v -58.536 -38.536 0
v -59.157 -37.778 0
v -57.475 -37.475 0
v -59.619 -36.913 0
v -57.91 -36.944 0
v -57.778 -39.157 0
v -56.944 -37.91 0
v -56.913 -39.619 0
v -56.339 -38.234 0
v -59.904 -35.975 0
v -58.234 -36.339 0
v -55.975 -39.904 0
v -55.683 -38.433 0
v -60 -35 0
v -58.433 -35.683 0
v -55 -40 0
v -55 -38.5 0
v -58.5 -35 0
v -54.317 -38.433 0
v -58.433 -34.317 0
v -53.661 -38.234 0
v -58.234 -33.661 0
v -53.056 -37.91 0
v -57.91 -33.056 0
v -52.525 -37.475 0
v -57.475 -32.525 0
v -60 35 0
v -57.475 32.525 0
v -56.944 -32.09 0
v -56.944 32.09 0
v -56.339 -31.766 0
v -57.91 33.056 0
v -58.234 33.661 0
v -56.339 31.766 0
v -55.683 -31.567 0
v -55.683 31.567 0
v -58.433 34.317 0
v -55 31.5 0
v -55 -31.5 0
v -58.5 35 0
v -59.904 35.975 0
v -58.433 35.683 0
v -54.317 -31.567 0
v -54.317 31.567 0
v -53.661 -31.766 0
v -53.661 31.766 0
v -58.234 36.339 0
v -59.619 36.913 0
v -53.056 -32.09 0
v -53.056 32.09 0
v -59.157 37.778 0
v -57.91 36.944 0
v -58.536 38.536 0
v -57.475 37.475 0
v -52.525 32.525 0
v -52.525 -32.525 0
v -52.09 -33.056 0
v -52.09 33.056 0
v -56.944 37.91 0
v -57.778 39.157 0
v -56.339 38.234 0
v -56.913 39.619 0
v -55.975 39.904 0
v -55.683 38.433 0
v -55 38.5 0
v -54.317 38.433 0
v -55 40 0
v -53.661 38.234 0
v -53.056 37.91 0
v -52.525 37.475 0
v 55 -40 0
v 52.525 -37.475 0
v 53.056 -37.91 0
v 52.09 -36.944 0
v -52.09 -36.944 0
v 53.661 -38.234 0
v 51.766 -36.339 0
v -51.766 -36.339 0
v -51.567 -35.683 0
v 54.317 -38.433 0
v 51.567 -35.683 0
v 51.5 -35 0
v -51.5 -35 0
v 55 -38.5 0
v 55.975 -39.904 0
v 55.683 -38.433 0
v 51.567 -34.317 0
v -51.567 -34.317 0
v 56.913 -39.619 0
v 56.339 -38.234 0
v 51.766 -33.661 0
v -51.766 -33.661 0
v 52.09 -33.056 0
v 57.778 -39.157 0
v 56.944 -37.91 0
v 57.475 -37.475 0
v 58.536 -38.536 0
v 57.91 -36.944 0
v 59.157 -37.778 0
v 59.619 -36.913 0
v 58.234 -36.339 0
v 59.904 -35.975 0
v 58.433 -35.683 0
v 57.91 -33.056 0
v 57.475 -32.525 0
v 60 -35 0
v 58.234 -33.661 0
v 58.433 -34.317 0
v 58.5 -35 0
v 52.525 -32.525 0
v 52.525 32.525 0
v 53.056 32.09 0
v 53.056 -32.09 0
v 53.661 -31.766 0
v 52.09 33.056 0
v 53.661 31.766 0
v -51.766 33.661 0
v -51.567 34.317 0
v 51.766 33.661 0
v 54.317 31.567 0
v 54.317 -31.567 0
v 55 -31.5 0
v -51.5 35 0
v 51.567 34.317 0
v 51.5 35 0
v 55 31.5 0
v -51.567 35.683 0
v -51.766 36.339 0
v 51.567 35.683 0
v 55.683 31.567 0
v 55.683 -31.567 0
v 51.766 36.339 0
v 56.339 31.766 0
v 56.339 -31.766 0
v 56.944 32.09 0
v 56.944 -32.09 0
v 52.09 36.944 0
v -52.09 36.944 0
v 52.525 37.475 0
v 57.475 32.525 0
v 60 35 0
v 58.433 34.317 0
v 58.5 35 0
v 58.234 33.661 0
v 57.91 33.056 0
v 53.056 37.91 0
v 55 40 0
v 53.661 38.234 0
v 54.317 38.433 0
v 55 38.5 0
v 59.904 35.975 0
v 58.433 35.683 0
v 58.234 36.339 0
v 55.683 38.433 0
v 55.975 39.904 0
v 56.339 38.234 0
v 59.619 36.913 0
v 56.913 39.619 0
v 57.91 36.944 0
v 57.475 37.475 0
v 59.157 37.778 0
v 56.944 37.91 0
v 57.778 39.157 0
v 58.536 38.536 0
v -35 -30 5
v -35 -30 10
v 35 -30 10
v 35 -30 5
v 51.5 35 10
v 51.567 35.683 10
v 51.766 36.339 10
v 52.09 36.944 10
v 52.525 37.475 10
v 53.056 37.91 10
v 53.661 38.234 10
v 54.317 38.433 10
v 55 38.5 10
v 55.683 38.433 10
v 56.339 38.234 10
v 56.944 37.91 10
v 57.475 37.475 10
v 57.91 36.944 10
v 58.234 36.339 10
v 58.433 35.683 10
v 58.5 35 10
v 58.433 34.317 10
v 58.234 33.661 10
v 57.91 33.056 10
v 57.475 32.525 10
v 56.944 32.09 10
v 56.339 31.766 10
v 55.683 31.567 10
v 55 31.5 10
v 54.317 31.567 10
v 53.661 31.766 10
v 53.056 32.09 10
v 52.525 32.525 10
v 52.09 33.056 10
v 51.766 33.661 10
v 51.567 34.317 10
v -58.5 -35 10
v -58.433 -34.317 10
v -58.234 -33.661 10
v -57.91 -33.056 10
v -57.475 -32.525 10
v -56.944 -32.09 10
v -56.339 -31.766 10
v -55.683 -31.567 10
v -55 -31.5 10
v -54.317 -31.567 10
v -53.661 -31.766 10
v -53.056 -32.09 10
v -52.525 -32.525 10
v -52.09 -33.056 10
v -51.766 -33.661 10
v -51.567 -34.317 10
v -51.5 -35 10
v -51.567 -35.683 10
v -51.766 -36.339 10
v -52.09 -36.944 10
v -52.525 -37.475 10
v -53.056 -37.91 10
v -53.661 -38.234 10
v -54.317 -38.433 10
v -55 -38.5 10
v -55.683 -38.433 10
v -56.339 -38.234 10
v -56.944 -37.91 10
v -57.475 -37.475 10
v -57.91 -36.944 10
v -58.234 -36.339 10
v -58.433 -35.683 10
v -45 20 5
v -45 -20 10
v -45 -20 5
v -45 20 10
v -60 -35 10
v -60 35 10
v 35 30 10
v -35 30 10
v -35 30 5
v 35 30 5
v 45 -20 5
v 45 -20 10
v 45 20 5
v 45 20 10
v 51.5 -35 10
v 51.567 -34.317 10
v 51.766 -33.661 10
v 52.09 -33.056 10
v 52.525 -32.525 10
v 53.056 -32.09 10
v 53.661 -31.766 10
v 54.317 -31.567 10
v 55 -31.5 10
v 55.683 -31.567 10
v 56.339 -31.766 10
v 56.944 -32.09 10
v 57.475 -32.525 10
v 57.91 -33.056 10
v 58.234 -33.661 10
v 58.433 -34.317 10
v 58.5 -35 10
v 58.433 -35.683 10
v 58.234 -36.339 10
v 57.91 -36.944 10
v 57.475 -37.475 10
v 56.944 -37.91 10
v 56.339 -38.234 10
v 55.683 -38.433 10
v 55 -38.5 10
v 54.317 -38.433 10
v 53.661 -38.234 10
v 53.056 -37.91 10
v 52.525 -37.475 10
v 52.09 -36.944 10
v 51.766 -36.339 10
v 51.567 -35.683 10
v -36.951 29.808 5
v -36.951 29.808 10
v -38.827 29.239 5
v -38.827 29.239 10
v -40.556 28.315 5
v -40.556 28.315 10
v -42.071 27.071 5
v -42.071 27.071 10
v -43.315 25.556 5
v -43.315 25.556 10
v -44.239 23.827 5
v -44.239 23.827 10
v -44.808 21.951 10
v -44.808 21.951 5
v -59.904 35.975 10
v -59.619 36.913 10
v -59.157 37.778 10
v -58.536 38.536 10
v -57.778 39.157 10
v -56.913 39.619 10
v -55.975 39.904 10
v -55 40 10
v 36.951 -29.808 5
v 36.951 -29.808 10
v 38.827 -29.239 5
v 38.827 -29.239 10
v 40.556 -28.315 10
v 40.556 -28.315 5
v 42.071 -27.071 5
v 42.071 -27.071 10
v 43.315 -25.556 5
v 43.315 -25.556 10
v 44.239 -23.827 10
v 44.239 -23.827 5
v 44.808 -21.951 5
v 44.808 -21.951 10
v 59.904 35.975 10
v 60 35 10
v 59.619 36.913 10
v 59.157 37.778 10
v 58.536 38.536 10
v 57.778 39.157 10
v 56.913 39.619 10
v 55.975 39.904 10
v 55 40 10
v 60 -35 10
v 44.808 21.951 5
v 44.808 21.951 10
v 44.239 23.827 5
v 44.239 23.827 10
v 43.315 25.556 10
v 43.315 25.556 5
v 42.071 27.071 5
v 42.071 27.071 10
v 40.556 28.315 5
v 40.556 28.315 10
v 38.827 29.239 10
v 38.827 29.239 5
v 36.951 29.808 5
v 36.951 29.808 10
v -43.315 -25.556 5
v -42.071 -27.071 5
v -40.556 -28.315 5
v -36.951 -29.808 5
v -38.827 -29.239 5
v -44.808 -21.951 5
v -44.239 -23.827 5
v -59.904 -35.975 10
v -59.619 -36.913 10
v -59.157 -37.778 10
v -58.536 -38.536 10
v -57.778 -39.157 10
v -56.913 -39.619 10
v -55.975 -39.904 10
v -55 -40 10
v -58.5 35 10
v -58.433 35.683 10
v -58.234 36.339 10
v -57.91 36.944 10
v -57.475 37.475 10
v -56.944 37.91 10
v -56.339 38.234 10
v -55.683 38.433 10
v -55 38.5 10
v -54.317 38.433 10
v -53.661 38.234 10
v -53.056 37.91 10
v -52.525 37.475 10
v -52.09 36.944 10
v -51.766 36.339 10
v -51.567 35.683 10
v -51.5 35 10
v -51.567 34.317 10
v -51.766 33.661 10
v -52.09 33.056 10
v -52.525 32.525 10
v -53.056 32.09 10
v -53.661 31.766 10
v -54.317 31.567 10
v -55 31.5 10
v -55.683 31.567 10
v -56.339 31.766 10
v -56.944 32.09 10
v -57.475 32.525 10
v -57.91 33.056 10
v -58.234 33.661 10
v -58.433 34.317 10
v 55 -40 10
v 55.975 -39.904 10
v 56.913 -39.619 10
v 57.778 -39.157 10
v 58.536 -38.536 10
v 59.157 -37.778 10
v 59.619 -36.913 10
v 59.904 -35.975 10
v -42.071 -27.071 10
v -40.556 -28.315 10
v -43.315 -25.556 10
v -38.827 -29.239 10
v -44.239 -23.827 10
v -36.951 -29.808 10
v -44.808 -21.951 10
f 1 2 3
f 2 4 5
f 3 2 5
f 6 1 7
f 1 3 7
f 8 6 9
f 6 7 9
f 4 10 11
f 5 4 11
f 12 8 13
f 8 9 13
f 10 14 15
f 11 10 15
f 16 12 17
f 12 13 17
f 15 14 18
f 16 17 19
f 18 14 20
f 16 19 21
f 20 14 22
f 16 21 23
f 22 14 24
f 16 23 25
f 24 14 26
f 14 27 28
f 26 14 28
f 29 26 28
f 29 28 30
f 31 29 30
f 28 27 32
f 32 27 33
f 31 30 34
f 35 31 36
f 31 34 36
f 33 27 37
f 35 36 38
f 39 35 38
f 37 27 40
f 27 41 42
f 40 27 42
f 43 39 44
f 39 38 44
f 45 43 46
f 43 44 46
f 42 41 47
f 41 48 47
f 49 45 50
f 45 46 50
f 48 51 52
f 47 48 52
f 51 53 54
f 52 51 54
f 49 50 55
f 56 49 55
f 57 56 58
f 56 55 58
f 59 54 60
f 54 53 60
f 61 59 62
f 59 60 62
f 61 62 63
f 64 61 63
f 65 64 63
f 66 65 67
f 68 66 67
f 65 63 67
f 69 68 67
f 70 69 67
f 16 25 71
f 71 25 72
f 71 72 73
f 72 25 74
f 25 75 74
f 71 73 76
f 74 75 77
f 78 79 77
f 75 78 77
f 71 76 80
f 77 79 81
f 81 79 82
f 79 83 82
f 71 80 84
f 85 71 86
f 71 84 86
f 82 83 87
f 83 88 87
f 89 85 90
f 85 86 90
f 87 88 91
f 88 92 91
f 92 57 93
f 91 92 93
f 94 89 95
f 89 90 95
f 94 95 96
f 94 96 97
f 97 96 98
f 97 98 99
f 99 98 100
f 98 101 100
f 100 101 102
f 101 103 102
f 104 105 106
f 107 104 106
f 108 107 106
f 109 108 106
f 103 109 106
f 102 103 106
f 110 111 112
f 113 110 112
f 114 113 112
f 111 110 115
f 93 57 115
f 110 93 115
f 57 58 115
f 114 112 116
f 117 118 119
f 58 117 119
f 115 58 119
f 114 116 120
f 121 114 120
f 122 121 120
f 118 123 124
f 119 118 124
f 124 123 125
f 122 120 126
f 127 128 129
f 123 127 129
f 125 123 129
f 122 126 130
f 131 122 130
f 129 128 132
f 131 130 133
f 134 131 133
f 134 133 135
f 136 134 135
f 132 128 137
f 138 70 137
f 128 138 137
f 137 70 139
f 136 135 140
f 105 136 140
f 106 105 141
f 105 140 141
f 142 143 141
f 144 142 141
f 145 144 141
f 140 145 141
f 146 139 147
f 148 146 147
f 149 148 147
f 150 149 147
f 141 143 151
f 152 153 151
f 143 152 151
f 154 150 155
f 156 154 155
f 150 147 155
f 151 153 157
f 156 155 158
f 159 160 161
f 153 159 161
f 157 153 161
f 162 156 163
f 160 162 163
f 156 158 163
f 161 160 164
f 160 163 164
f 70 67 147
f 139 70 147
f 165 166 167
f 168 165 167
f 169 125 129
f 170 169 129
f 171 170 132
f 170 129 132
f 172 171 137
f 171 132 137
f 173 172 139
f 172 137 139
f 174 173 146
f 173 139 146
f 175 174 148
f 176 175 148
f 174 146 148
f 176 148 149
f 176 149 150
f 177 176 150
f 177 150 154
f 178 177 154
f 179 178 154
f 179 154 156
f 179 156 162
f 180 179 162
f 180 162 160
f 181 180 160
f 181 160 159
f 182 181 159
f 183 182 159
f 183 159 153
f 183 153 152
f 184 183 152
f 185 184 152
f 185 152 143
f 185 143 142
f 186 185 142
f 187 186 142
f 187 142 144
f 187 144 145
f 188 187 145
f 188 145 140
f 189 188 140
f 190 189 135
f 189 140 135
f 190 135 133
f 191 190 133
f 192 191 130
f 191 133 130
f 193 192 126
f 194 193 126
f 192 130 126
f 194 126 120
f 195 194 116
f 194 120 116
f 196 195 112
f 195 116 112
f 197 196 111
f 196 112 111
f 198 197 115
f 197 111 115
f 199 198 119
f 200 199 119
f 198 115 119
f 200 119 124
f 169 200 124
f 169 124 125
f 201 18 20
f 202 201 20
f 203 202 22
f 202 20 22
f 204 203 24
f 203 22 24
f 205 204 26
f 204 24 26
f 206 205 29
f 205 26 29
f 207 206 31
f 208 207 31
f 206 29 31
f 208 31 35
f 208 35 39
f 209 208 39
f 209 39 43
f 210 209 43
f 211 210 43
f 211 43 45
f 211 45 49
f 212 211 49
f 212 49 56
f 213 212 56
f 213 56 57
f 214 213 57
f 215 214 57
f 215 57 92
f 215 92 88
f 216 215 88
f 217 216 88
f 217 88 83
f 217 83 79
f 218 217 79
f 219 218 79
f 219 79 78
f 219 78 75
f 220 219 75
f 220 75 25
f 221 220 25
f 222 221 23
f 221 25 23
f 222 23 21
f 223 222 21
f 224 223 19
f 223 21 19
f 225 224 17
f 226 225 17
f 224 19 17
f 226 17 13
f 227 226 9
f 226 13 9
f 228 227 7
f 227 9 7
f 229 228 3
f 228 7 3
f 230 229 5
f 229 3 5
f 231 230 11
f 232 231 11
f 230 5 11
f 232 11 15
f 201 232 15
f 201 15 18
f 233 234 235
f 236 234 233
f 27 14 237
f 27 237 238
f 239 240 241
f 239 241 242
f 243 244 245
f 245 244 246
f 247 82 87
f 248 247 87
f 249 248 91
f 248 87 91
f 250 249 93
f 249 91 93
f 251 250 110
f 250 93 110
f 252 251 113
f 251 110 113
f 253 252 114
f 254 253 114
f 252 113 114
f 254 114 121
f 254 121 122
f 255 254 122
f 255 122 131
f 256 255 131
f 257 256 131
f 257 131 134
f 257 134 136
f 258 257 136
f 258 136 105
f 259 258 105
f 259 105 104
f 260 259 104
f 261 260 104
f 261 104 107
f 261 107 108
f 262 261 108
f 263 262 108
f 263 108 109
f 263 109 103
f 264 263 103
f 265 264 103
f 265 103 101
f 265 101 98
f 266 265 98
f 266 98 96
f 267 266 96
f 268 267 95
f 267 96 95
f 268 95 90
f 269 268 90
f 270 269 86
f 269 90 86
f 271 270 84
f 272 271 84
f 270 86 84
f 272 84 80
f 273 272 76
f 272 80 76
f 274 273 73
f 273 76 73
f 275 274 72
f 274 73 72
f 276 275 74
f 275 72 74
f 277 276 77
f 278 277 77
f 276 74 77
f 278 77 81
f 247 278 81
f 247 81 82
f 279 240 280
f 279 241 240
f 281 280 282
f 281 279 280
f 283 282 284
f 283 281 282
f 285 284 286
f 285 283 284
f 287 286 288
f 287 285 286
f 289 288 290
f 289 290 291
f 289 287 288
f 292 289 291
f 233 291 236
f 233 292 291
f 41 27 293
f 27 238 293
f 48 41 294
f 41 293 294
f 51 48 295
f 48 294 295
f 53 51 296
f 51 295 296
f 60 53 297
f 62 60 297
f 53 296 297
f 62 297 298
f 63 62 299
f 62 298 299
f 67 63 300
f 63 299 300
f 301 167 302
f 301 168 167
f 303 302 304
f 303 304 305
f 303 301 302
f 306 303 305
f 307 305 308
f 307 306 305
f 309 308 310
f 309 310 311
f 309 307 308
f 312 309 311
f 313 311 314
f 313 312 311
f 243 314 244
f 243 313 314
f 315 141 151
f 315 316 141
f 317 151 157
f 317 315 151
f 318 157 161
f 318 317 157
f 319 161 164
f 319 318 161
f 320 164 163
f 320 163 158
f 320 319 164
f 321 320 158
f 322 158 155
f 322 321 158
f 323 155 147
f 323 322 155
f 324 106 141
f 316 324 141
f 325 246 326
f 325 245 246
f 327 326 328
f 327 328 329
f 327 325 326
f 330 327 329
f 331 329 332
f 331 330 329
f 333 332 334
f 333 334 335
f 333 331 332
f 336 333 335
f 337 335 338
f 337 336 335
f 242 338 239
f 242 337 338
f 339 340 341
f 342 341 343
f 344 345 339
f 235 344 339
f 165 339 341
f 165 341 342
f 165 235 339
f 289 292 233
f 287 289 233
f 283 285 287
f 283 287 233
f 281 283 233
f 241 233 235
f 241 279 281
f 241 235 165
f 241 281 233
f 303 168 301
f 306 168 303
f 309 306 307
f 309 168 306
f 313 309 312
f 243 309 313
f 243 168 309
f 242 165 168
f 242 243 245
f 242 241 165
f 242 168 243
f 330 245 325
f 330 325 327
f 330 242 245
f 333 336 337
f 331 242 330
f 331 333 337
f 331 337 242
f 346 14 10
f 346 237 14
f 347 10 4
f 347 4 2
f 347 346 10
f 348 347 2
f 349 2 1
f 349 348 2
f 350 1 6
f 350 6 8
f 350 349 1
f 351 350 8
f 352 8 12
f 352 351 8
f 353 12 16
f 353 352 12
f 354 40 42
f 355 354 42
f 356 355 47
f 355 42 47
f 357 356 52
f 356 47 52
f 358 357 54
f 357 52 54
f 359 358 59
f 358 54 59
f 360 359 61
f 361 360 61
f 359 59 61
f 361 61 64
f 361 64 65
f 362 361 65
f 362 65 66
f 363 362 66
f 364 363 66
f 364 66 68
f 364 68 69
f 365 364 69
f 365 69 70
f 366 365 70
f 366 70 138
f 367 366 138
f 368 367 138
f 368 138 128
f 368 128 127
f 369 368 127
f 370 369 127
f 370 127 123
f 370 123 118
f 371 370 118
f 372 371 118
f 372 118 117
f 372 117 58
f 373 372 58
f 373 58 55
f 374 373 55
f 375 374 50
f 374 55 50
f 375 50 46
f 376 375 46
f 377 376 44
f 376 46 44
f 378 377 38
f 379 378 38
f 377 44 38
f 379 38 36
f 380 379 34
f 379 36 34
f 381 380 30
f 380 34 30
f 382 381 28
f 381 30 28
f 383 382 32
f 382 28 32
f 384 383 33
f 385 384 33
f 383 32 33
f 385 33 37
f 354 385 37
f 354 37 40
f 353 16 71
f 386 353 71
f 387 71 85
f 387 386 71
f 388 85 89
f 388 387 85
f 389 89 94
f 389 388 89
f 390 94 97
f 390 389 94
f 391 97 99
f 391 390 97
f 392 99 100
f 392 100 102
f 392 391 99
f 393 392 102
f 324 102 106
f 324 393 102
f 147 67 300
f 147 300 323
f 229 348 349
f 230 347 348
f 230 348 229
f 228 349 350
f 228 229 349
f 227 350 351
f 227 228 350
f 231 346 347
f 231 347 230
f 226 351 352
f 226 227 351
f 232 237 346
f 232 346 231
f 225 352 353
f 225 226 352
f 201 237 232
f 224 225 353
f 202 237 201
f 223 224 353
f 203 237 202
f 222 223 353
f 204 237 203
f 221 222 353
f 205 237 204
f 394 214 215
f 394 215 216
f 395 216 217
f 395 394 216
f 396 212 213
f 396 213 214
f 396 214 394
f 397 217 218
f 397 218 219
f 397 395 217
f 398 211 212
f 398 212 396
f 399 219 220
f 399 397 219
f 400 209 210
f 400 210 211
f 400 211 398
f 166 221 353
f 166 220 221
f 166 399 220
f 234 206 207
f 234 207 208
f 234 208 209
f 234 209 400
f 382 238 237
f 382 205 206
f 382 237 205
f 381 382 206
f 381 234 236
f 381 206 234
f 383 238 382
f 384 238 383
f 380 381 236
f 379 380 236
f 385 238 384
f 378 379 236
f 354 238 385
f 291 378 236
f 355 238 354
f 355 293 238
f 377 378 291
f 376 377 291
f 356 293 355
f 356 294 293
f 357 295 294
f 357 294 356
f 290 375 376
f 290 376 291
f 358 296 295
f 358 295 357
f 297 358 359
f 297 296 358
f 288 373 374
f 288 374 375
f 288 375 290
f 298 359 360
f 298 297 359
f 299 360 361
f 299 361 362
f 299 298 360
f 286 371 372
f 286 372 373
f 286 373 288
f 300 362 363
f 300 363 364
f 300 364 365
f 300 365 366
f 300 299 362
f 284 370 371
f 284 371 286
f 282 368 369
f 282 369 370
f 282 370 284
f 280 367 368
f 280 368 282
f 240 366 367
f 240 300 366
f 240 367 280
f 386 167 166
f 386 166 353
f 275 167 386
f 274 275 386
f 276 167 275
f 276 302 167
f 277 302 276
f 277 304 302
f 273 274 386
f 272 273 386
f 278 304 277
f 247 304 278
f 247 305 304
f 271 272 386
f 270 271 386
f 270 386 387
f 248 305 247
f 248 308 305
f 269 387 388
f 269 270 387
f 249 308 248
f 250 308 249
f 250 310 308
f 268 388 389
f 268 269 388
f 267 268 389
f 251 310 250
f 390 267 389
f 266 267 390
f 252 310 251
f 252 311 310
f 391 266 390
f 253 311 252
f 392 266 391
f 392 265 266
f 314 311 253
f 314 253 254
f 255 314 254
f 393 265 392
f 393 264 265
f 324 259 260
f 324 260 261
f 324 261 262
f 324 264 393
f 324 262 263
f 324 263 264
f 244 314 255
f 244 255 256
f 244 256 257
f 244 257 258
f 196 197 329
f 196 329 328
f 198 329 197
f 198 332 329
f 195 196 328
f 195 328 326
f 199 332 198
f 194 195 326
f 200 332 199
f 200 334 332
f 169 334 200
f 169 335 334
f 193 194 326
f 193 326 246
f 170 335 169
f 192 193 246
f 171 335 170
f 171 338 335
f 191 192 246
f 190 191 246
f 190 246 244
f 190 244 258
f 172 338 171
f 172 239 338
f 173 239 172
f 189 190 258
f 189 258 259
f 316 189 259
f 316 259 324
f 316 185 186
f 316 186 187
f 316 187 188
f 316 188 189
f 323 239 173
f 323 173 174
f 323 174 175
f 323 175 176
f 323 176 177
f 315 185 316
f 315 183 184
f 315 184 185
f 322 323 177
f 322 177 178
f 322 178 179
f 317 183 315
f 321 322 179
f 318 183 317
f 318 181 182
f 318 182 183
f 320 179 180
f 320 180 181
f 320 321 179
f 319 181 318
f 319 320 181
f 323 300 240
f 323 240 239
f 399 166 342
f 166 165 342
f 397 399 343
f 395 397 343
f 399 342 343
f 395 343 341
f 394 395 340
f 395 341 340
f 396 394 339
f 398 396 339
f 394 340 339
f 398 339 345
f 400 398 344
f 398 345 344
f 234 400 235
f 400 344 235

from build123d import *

# Parameters (mm, degrees)
F0_W     = 120
F0_H     = 80
F1_DEPTH = 10
F2_R     = 5
F3_W     = 90
F3_H     = 60
F4_DEPTH = 5
F5_R     = 10
F7_D     = 7


with BuildPart() as f1:
    # F0 (on Top) → F1 (new body)
    with BuildSketch(Plane.XY):
        Rectangle(F0_W, F0_H)
    extrude(amount=F1_DEPTH)

    # F2
    f2_edges = [f1.edges().sort_by_distance(p)[0] for p in [
        (60, -40, 5),
        (60, 40, 5),
        (-60, -40, 5),
        (-60, 40, 5),
    ]]
    fillet(f2_edges, radius=F2_R)

    # F3 (on face) → F4 (cut)
    with BuildSketch(Plane.XY.offset(10)):
        Rectangle(F3_W, F3_H)
    extrude(amount=-F4_DEPTH, mode=Mode.SUBTRACT)

    # F5
    f5_edges = [f1.edges().sort_by_distance(p)[0] for p in [
        (-45, 30, 7.5),
        (45, 30, 7.5),
        (45, -30, 7.5),
        (-45, -30, 7.5),
    ]]
    fillet(f5_edges, radius=F5_R)

    # F7 (through all)
    with Locations(Plane.XY.offset(10)):
        with Locations((-55, -35), (-55, 35), (55, -35), (55, 35)):
            Hole(F7_D / 2)


solid = f1.part
